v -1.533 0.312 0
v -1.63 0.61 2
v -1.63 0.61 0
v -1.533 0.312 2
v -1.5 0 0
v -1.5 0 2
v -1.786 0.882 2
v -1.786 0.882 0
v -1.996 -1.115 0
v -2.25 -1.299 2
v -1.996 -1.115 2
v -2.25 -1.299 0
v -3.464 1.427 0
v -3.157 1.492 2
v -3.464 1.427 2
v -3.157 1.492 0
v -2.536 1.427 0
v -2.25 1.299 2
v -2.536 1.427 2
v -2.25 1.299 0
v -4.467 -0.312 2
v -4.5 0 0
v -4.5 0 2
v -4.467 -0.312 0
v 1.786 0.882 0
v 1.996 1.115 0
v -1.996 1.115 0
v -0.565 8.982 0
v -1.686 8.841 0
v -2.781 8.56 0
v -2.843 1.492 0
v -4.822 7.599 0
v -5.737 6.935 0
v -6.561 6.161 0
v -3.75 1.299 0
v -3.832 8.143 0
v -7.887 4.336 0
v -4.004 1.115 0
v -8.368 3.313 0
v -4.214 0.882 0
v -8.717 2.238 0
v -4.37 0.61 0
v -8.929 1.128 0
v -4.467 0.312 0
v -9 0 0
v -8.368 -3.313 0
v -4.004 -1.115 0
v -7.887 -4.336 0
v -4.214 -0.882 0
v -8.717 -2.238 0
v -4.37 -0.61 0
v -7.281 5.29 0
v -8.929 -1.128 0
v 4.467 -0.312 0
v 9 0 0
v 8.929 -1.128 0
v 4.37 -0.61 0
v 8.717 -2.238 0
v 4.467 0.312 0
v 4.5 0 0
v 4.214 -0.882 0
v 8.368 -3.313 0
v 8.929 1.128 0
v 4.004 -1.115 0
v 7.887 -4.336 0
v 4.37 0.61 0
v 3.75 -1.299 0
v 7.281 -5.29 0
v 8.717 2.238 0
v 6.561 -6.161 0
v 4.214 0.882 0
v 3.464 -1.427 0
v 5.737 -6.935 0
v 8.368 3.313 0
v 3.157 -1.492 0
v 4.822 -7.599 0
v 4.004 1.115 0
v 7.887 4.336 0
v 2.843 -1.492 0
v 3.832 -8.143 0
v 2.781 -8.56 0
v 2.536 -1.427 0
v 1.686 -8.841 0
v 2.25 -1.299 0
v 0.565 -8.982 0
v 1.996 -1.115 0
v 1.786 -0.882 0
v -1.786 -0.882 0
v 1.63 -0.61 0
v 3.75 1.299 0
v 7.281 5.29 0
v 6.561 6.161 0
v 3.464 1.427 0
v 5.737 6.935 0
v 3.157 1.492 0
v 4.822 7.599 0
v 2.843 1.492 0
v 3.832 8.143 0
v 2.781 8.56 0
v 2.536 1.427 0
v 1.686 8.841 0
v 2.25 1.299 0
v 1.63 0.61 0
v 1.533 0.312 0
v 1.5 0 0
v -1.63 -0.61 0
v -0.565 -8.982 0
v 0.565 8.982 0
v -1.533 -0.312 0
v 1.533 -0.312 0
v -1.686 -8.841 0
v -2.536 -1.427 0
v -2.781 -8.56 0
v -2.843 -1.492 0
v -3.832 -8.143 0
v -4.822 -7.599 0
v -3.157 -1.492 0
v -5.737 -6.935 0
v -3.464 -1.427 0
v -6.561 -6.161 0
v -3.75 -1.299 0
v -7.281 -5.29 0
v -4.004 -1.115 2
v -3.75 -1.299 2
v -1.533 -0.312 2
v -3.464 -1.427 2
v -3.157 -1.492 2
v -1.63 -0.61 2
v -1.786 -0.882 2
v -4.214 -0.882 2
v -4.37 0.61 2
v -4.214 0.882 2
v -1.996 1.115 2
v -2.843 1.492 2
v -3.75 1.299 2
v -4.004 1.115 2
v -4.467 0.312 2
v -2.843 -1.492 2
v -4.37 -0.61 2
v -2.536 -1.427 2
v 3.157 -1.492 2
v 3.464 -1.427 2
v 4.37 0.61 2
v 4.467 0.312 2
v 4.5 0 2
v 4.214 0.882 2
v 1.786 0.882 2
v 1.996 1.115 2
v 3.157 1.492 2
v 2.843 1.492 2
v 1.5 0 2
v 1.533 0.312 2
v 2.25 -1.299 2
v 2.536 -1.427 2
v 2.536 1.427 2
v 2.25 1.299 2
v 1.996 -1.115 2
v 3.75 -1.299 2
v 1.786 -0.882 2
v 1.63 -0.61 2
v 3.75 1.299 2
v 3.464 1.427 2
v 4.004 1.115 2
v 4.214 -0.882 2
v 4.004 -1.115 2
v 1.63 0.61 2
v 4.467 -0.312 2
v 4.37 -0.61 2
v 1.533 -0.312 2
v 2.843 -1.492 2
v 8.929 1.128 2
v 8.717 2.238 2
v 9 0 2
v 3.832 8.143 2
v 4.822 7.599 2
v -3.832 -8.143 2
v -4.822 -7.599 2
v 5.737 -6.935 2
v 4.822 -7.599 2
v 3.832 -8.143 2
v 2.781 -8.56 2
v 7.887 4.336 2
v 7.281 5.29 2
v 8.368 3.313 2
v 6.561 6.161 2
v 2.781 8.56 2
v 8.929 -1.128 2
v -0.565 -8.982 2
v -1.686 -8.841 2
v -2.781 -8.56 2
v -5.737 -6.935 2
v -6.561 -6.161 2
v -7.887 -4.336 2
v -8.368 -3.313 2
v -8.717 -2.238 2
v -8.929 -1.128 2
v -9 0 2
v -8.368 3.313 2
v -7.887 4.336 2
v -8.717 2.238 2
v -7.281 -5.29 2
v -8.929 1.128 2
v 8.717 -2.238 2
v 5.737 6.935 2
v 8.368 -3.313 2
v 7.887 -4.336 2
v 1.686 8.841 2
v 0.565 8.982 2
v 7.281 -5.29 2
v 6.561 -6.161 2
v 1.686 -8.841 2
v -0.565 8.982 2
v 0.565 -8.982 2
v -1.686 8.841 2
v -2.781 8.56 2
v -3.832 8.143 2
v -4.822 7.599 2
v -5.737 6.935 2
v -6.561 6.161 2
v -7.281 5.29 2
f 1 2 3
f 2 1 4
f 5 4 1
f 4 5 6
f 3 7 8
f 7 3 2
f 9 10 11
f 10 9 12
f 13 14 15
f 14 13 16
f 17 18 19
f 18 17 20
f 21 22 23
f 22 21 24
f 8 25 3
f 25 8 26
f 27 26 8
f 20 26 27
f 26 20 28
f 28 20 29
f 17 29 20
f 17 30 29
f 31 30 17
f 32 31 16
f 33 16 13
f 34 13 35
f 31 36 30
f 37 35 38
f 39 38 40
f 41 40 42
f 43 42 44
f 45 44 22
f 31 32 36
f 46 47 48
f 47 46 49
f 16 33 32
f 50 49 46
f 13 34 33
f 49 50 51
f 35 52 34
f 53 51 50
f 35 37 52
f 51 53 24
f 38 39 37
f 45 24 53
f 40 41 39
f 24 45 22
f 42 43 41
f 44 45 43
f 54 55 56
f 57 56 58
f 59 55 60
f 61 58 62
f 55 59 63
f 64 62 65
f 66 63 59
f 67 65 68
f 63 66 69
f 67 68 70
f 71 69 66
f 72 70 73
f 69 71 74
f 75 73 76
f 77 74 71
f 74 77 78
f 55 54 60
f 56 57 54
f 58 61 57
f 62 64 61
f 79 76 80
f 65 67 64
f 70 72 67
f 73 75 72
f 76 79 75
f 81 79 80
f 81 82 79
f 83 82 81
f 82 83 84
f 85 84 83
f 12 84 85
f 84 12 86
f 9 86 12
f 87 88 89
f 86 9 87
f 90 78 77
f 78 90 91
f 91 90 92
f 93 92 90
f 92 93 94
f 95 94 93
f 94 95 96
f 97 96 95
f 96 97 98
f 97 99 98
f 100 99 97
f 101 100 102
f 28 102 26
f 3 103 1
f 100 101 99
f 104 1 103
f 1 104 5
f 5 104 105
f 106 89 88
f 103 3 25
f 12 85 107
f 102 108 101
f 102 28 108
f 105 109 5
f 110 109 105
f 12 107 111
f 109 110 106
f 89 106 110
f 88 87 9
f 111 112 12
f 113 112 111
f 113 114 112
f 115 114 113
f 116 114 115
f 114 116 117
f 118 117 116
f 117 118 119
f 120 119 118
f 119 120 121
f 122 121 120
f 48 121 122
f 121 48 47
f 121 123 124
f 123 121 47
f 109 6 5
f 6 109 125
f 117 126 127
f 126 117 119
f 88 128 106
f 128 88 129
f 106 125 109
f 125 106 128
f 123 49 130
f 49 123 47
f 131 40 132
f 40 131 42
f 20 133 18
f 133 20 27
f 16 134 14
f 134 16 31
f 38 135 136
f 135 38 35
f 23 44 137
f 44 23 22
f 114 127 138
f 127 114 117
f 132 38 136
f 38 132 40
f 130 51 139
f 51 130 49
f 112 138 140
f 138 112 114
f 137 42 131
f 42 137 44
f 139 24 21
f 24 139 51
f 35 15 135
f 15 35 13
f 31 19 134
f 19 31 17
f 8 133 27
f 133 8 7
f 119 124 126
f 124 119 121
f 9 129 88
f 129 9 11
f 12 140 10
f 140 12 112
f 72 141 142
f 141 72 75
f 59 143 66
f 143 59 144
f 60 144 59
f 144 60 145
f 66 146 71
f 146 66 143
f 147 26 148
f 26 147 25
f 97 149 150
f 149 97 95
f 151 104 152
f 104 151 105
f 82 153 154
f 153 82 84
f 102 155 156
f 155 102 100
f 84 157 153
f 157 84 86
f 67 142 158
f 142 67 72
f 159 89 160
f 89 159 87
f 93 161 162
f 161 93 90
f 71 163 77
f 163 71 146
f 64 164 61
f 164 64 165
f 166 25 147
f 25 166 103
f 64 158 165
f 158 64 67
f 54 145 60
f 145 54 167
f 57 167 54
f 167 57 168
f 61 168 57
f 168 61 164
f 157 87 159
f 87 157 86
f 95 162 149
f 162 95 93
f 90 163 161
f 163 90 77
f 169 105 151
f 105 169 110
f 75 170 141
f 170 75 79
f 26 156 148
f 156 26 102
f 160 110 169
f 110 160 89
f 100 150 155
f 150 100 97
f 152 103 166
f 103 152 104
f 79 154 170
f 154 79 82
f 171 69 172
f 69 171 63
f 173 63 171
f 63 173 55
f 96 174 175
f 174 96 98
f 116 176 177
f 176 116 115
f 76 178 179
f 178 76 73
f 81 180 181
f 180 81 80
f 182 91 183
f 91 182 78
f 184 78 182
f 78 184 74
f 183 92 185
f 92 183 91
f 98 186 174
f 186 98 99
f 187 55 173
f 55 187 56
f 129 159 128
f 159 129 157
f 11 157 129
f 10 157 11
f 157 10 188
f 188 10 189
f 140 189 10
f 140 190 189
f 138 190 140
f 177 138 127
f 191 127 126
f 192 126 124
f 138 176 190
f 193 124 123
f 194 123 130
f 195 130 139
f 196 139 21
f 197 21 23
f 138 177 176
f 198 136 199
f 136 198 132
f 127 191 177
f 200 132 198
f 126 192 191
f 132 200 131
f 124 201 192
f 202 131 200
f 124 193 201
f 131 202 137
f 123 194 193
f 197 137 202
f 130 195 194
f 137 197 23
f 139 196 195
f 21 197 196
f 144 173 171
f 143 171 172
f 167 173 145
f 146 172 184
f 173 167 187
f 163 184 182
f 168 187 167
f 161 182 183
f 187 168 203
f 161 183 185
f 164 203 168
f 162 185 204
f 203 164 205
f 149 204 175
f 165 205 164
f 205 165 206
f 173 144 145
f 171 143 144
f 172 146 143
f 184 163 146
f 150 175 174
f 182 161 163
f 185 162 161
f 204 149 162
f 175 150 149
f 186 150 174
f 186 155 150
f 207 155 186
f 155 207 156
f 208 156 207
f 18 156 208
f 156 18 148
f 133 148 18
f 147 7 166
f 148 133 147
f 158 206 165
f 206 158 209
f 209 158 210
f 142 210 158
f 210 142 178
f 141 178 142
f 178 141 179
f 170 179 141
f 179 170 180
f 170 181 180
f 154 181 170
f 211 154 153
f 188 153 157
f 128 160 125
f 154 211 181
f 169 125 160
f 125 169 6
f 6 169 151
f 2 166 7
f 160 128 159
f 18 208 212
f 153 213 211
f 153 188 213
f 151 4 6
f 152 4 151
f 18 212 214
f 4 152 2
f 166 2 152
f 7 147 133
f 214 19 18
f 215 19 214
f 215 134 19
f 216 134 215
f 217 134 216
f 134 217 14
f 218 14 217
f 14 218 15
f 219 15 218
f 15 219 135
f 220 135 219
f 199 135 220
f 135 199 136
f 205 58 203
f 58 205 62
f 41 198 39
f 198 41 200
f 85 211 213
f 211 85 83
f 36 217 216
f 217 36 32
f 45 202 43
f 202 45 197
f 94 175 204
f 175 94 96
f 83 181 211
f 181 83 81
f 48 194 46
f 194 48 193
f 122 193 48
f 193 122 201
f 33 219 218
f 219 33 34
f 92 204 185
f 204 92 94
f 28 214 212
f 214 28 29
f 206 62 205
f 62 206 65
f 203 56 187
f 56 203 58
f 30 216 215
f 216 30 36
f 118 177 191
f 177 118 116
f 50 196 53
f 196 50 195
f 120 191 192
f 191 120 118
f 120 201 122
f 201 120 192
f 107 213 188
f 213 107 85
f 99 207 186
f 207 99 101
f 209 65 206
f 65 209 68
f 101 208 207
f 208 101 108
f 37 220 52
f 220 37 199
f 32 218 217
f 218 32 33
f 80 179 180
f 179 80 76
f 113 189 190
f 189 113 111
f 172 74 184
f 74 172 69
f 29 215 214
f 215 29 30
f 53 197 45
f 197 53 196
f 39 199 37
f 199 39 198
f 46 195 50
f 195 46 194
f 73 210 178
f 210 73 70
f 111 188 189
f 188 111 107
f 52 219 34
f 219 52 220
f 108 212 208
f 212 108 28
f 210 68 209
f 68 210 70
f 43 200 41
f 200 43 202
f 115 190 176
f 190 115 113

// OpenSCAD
//CUSTOMIZER VARIABLES

//	Radius of button
rbut = 9;

//	Distance between holes
dholes = 6;

//	Radius of holes
rhole=1.5;

//	Height of button
hbut=2;

//CUSTOMIZER VARIABLES END

difference() {
    cylinder(h=hbut, r1=rbut, r2=rbut, $fn=50);
    union() {
        translate([-dholes/2,0,0])
            cylinder(h=hbut*2, r1=rhole, r2=rhole, $fn=30);
        translate([dholes/2,0,0])
            cylinder(h=hbut*2, r1=rhole, r2=rhole, $fn=30);
    }
}
